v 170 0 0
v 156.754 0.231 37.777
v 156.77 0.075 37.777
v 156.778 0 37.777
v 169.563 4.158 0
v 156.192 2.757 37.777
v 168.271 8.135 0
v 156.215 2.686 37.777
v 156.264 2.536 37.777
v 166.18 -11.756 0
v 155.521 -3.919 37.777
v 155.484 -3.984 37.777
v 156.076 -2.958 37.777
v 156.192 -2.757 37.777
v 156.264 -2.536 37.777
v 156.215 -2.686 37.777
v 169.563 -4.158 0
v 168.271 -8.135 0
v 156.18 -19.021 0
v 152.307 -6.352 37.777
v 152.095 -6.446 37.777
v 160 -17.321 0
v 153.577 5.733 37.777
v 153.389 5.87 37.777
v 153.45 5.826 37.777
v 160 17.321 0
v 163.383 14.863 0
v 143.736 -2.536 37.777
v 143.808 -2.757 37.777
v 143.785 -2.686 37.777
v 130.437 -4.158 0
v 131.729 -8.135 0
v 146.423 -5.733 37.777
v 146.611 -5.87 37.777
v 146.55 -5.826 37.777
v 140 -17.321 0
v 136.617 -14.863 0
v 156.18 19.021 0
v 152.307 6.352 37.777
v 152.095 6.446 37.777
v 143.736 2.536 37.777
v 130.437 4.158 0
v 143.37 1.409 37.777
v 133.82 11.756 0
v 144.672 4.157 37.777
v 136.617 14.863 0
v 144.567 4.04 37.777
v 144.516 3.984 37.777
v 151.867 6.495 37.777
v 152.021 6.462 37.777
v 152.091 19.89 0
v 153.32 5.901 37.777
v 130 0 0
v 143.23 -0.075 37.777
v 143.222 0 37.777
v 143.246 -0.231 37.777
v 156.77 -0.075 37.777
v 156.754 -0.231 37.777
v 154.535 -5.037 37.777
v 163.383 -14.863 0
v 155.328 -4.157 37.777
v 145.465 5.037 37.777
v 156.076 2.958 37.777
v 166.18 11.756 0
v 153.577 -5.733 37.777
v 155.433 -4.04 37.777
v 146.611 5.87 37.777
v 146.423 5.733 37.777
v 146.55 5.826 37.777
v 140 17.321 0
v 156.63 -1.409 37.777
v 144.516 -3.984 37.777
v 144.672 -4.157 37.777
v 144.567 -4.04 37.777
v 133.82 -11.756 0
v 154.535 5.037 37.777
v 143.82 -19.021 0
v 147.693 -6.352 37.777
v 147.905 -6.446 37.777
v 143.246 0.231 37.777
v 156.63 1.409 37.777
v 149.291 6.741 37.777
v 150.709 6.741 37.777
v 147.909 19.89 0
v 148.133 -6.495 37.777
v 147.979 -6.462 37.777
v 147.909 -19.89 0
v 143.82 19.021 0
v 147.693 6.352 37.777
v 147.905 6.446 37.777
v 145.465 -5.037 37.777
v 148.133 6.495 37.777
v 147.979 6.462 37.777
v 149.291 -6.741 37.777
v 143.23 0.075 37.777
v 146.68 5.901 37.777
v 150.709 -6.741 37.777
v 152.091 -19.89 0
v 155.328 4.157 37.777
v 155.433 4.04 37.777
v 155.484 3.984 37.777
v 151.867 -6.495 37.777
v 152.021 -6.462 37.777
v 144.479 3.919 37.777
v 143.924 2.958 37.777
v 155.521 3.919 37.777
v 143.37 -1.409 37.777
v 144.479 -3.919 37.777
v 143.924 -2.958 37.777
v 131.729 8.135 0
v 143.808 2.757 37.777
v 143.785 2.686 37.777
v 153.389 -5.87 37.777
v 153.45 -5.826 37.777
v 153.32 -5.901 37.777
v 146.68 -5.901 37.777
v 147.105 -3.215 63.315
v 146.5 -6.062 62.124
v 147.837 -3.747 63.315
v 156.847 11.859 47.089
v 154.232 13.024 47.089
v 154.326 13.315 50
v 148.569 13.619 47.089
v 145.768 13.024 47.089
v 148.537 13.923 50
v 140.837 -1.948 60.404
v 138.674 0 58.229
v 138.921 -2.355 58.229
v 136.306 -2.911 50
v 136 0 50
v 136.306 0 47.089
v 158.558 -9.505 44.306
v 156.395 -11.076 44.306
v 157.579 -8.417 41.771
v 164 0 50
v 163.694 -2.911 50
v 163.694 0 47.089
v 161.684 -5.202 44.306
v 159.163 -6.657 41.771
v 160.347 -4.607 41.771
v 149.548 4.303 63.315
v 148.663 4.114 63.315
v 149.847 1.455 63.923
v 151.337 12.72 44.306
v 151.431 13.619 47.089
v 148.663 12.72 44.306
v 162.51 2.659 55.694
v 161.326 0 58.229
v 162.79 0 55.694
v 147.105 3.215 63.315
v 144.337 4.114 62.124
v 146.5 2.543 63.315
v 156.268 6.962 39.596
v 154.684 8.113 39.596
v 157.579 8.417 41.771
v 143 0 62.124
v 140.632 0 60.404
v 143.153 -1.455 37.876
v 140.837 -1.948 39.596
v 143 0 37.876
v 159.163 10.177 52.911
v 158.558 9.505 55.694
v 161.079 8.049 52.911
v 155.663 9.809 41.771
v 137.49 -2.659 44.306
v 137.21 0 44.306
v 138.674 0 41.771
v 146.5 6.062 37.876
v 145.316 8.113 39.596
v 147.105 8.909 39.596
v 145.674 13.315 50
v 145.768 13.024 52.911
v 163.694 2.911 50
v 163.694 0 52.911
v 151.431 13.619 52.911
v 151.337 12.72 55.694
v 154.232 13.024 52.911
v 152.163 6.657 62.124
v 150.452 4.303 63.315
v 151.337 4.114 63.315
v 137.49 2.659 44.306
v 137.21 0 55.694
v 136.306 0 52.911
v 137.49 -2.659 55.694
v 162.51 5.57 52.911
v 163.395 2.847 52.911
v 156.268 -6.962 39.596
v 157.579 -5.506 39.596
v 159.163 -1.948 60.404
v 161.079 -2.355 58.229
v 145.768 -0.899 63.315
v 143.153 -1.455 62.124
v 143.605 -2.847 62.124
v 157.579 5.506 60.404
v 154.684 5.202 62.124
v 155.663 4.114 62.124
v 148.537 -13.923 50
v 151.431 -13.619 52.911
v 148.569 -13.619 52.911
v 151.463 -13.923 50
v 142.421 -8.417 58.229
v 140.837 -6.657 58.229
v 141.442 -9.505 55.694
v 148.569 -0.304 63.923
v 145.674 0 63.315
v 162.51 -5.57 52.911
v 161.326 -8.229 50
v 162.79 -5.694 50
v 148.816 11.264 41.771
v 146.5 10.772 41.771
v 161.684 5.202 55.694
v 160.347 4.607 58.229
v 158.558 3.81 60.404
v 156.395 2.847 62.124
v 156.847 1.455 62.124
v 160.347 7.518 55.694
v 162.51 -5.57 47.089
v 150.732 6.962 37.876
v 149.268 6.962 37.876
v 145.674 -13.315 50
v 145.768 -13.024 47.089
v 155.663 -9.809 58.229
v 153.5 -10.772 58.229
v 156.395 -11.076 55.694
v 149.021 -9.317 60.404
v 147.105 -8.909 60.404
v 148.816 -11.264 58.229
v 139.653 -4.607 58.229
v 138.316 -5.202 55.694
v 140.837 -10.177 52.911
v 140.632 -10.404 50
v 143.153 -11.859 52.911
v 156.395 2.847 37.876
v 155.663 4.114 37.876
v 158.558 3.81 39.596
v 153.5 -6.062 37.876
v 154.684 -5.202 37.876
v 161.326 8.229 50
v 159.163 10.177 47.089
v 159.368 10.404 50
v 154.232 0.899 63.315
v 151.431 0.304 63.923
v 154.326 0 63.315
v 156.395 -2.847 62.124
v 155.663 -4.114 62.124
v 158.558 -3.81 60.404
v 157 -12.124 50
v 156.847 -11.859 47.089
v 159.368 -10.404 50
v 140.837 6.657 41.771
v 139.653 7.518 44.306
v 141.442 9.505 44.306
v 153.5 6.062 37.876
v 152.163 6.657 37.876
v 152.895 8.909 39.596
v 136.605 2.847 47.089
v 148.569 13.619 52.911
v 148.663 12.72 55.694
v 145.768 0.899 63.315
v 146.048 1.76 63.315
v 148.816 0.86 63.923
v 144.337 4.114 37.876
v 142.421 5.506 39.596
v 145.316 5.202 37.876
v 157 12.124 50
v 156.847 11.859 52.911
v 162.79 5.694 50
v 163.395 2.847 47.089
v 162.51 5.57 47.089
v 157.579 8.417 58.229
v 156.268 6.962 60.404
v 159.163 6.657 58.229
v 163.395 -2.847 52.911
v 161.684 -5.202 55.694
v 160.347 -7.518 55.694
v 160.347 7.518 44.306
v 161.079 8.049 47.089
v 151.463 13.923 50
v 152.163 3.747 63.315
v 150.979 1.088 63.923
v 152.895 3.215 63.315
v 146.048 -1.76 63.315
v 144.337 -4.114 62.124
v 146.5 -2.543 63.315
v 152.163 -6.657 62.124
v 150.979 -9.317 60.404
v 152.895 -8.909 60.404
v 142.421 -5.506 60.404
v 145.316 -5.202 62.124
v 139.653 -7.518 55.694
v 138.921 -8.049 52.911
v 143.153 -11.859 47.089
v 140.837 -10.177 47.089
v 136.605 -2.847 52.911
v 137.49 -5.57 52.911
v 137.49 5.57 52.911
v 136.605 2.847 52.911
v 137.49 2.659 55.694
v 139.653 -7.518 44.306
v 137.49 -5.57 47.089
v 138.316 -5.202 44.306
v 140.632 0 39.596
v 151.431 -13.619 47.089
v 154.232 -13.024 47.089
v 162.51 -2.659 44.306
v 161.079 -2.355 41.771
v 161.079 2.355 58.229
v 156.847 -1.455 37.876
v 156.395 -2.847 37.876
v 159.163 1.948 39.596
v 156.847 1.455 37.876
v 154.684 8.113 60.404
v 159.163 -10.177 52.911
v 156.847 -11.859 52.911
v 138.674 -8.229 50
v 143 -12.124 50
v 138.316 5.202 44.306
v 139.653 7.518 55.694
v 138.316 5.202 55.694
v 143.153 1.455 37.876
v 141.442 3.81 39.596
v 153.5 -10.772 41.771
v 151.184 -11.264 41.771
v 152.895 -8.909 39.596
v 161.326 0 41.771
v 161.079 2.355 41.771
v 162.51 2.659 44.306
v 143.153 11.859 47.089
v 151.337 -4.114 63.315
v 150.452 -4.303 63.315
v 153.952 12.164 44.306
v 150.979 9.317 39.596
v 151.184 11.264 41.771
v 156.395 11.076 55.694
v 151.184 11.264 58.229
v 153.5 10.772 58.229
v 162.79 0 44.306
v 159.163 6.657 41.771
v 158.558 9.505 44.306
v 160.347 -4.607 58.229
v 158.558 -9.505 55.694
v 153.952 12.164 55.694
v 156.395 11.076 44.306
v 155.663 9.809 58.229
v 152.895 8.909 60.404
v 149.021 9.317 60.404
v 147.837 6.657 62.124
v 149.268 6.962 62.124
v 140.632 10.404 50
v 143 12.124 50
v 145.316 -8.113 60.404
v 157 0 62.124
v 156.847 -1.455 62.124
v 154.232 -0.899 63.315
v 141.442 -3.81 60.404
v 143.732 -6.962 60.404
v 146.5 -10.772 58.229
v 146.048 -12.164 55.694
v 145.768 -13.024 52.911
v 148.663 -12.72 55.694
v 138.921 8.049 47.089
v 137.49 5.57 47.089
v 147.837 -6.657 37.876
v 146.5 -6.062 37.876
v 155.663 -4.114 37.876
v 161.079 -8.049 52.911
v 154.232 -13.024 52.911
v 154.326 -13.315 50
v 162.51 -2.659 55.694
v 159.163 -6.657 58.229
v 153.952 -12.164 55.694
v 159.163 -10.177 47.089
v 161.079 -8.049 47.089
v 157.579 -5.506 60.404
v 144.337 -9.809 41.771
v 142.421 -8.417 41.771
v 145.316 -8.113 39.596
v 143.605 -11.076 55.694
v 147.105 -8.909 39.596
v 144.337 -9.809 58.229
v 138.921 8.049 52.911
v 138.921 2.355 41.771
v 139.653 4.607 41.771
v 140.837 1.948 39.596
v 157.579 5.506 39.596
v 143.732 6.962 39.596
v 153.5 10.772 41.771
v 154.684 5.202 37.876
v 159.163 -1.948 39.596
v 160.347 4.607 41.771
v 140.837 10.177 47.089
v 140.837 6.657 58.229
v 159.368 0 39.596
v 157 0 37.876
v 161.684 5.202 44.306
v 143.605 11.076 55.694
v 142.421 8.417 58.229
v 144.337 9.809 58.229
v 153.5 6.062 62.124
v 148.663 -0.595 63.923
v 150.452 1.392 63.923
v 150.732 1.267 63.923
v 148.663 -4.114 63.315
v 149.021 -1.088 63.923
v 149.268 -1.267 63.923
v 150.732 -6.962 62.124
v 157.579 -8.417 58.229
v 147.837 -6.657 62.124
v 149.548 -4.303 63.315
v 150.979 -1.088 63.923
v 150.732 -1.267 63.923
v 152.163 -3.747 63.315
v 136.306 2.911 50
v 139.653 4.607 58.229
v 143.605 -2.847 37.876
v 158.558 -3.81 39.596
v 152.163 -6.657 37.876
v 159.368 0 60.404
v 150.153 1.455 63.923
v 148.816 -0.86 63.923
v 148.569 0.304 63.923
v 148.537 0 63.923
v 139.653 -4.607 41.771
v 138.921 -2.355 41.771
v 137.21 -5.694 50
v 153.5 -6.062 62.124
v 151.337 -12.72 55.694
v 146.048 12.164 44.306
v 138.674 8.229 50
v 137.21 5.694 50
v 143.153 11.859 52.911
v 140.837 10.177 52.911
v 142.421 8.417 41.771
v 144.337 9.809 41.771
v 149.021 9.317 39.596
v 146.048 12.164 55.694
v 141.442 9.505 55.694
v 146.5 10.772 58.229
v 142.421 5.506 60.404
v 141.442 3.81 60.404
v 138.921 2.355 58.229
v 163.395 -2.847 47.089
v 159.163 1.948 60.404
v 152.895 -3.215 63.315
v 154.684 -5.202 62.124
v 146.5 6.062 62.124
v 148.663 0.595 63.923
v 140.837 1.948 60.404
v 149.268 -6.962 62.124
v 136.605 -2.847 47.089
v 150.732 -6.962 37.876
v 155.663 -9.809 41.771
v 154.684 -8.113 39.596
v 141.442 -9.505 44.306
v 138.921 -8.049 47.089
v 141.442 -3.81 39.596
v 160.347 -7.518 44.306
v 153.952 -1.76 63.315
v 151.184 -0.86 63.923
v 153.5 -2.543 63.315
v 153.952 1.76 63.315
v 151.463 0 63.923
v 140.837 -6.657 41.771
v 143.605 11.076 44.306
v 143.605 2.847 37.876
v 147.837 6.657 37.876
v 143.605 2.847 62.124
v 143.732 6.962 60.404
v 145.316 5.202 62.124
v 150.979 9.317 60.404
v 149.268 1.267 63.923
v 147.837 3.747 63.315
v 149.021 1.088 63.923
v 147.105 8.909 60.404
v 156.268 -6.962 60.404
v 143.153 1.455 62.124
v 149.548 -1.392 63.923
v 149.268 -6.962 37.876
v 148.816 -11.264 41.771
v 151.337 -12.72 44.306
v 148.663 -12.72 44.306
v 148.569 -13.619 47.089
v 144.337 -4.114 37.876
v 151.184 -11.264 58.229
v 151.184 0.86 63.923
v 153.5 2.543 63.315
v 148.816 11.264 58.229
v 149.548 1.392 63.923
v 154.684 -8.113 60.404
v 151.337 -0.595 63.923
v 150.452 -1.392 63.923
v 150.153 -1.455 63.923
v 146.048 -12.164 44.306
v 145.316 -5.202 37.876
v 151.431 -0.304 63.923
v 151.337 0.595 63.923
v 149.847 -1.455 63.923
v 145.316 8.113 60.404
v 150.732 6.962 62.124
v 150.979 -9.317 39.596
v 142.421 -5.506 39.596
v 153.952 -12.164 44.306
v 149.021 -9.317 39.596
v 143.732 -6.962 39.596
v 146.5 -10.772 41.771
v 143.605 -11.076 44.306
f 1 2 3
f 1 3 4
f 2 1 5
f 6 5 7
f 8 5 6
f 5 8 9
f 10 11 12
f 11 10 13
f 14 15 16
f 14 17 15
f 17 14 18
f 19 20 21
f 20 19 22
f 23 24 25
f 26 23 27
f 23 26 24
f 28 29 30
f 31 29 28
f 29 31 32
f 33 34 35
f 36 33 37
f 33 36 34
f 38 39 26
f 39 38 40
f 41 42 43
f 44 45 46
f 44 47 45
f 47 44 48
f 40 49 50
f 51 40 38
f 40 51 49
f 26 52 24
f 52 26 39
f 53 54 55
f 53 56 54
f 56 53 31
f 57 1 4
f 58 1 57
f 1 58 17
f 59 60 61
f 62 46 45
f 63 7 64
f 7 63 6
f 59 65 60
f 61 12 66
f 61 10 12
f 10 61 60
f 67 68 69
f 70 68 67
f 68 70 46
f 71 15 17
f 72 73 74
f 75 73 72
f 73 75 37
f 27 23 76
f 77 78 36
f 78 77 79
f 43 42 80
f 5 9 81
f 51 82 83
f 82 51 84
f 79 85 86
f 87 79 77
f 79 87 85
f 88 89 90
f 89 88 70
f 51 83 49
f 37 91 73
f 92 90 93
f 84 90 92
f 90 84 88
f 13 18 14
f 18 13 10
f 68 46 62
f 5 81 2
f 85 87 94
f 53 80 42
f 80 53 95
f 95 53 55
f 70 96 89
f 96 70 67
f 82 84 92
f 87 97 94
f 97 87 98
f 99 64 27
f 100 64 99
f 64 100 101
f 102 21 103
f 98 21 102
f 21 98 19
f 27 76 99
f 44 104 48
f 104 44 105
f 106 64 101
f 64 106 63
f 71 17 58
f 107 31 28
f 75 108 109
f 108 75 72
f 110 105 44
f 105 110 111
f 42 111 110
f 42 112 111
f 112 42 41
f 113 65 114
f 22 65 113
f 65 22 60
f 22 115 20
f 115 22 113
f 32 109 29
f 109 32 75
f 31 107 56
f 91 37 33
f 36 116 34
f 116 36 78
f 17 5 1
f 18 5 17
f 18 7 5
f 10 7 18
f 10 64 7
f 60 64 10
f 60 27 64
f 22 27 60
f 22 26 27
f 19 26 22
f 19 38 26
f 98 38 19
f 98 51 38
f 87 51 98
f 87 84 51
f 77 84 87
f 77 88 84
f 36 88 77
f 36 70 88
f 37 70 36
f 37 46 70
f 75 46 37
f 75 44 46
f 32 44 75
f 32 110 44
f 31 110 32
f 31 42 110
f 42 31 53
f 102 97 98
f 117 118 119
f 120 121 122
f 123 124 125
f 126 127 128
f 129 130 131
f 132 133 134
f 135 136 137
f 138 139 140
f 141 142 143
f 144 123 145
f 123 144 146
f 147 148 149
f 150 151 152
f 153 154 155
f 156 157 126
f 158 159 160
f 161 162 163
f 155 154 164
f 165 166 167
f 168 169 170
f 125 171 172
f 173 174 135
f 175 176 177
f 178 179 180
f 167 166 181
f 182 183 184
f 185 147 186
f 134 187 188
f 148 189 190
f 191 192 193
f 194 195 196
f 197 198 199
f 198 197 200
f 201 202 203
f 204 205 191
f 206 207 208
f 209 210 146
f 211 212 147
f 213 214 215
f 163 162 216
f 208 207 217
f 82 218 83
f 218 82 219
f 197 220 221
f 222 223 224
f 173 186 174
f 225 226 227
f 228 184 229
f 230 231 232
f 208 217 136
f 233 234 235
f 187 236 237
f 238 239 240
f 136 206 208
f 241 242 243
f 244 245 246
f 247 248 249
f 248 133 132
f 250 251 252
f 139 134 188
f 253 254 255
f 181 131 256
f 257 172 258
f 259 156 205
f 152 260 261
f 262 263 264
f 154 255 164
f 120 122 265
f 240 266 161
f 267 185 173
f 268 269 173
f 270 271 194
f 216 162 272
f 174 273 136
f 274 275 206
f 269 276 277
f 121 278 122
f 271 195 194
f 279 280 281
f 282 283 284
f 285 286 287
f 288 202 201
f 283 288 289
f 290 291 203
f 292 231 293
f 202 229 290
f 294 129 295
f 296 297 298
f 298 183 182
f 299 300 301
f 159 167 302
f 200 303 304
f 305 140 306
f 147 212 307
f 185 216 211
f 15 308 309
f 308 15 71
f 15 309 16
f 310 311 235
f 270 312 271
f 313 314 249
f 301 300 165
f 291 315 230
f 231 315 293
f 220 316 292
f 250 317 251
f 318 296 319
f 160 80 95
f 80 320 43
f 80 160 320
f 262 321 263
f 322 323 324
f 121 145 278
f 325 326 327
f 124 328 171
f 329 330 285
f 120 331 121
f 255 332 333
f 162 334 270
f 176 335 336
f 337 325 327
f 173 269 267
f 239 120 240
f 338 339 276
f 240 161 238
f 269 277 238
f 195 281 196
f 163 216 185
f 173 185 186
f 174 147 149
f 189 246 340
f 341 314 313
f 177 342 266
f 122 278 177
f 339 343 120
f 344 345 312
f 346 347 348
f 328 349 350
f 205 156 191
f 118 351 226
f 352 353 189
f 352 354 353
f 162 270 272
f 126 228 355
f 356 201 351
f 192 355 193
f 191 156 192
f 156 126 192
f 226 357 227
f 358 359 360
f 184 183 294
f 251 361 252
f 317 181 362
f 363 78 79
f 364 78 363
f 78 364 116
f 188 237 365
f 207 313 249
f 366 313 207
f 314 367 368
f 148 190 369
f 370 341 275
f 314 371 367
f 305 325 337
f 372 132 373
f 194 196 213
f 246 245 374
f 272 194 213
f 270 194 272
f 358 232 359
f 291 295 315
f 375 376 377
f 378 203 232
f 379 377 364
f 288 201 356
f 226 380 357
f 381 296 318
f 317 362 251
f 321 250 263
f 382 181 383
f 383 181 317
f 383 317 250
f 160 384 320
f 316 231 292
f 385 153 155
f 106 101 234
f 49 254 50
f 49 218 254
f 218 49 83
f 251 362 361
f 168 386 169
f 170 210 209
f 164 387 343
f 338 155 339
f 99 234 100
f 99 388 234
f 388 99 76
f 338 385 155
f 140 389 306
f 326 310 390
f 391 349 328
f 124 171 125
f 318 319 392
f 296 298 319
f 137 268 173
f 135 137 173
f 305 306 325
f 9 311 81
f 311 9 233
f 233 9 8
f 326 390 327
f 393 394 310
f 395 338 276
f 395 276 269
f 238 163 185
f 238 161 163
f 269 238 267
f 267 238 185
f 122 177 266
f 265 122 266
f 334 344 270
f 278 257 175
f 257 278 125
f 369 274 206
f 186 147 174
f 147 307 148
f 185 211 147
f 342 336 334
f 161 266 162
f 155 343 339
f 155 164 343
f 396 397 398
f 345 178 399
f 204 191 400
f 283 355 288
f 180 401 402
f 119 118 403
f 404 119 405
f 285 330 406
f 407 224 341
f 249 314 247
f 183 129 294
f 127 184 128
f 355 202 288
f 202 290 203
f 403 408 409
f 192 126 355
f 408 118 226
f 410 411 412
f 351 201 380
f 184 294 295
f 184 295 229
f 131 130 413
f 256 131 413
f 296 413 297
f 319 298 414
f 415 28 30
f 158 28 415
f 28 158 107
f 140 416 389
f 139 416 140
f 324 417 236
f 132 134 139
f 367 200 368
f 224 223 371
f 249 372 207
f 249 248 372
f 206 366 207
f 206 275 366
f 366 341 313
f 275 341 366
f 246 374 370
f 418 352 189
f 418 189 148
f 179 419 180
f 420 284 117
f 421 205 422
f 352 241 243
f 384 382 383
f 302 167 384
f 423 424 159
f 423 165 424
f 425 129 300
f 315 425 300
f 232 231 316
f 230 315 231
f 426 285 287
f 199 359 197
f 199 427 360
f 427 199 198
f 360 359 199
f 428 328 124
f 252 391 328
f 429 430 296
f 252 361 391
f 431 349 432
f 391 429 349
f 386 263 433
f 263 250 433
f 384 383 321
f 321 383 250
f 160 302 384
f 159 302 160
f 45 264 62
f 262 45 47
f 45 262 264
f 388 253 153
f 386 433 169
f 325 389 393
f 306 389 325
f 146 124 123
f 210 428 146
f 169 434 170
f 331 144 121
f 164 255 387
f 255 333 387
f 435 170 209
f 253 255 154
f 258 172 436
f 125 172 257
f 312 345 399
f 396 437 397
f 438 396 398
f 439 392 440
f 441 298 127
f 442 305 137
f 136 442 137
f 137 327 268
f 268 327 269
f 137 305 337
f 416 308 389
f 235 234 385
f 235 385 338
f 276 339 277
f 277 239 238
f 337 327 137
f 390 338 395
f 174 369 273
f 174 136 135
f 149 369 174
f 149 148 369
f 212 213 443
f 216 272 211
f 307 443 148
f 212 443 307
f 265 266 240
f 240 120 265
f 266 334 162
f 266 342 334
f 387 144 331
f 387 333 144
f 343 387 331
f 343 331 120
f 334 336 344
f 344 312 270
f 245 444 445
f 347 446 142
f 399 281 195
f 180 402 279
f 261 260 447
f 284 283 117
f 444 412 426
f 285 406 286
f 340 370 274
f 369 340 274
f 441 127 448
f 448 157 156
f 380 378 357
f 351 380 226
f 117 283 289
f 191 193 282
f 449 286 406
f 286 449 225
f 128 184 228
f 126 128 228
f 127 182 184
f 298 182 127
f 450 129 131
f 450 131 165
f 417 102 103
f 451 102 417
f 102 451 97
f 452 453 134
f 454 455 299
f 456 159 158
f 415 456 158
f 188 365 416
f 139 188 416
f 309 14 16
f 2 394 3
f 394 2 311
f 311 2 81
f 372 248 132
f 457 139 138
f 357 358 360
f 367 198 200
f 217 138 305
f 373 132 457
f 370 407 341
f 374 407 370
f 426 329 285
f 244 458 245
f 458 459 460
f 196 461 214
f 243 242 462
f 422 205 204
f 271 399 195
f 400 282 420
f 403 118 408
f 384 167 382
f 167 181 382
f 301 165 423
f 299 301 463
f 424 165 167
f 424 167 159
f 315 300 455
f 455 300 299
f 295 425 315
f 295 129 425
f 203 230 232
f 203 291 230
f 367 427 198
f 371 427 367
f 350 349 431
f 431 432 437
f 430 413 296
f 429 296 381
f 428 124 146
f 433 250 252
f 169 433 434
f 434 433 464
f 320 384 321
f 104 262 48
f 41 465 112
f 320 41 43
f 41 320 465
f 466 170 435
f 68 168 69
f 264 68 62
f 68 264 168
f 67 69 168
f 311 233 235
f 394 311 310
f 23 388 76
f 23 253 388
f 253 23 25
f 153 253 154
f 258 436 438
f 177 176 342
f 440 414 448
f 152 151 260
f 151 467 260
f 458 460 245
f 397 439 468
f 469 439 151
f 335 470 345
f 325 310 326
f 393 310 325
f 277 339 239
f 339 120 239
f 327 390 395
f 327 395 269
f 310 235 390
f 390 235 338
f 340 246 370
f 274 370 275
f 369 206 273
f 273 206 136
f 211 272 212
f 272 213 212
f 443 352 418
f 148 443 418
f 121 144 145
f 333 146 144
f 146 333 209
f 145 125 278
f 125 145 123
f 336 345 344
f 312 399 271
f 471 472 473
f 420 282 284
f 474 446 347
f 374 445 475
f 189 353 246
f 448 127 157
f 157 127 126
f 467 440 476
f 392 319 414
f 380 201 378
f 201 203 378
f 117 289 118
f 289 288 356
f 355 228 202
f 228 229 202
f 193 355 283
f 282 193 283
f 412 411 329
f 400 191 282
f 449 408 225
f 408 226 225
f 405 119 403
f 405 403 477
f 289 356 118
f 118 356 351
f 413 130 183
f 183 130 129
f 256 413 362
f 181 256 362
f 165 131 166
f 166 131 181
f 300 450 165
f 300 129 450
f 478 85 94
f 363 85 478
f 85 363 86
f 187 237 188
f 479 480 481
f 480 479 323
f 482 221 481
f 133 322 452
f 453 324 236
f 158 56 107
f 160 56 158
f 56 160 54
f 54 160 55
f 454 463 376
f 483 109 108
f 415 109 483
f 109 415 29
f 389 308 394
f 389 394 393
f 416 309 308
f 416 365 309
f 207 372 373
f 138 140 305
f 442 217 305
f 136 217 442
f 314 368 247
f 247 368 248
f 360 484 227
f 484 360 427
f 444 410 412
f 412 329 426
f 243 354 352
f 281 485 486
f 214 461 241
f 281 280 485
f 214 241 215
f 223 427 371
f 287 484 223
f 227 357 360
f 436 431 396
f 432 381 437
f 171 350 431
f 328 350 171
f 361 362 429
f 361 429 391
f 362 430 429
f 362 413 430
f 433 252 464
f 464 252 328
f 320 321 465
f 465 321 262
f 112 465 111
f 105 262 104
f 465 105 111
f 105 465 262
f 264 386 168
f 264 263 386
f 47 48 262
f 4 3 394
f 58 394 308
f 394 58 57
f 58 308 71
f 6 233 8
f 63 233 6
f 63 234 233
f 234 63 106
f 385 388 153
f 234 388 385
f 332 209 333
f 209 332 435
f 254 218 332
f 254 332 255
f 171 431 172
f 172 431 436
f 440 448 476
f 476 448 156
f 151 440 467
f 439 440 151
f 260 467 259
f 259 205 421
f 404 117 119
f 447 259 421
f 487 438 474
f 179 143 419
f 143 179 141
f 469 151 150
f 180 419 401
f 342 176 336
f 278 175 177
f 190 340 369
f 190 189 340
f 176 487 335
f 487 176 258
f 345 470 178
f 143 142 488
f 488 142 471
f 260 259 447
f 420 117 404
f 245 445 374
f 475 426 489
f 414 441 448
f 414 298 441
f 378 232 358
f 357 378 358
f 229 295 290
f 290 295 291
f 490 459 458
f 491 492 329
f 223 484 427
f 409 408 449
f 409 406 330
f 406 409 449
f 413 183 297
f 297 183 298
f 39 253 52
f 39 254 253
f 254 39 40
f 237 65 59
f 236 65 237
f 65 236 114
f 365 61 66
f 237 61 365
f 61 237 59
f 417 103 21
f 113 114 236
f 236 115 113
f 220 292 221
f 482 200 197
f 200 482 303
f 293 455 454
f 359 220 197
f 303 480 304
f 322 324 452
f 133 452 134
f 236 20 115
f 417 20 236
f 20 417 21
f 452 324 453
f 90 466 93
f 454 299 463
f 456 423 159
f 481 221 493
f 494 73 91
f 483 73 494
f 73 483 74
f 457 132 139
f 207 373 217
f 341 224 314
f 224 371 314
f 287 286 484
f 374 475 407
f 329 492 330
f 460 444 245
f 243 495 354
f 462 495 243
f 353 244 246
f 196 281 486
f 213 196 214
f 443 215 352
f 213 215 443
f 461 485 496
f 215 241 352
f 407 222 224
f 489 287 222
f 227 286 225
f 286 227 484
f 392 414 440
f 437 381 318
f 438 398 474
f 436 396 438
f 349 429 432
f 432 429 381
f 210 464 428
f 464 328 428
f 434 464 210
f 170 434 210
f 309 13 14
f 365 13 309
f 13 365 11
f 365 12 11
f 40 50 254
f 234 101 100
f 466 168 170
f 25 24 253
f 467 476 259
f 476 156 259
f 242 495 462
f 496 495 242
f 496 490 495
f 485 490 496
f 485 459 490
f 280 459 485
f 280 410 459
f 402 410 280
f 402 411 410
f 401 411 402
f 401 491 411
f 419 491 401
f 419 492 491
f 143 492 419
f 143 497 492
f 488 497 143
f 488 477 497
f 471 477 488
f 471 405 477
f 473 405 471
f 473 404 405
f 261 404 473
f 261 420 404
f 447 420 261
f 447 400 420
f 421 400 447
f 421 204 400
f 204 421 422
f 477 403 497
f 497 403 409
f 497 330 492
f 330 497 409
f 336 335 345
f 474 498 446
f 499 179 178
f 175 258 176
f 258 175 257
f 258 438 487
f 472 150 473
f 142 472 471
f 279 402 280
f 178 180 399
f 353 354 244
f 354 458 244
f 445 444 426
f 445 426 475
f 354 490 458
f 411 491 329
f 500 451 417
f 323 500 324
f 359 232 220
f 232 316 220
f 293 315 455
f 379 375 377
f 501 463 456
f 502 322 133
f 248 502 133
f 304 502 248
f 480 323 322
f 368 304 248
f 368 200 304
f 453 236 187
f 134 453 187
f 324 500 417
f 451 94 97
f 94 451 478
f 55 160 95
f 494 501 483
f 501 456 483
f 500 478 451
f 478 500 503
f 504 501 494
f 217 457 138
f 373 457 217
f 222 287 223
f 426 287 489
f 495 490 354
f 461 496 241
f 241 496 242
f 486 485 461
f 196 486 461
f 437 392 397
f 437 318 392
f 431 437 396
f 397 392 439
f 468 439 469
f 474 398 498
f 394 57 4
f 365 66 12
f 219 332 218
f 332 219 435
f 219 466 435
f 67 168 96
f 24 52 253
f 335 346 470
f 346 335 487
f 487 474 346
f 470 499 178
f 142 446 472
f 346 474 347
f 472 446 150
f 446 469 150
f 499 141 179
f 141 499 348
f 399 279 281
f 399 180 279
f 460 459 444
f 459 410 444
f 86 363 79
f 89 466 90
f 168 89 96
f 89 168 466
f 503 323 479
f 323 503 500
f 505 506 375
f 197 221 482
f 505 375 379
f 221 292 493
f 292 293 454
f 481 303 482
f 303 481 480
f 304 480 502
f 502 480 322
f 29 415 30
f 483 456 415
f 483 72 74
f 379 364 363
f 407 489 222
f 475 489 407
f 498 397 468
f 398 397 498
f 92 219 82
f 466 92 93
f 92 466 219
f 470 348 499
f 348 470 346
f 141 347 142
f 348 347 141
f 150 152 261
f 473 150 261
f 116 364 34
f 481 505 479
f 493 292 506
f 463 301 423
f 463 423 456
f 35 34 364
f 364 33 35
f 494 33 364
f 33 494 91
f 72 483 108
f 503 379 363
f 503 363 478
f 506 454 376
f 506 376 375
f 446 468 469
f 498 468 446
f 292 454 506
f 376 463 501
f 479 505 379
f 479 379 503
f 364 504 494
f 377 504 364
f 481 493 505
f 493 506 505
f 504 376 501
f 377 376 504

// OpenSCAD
// code
schrauben_durchmesser = 8.124;
/*
color("Red")
    difference() {
        cube([100,200,10]);
        translate([50,100,-4])
            cylinder(h=30,r=schrauben_durchmesser/2,$fn=30);
    }
*/
    
translate([150,0,0])
    color("Green") union() {
        cylinder(h=40,r1 = 20, r2=6);
        translate([0,0,50]) sphere(r=14);
    }

/*
translate([300,0,0]) {
    intersection() {
        #sphere(r=40);
        cylinder(h=100,r=20,center=true);
    }
}
*/
    
